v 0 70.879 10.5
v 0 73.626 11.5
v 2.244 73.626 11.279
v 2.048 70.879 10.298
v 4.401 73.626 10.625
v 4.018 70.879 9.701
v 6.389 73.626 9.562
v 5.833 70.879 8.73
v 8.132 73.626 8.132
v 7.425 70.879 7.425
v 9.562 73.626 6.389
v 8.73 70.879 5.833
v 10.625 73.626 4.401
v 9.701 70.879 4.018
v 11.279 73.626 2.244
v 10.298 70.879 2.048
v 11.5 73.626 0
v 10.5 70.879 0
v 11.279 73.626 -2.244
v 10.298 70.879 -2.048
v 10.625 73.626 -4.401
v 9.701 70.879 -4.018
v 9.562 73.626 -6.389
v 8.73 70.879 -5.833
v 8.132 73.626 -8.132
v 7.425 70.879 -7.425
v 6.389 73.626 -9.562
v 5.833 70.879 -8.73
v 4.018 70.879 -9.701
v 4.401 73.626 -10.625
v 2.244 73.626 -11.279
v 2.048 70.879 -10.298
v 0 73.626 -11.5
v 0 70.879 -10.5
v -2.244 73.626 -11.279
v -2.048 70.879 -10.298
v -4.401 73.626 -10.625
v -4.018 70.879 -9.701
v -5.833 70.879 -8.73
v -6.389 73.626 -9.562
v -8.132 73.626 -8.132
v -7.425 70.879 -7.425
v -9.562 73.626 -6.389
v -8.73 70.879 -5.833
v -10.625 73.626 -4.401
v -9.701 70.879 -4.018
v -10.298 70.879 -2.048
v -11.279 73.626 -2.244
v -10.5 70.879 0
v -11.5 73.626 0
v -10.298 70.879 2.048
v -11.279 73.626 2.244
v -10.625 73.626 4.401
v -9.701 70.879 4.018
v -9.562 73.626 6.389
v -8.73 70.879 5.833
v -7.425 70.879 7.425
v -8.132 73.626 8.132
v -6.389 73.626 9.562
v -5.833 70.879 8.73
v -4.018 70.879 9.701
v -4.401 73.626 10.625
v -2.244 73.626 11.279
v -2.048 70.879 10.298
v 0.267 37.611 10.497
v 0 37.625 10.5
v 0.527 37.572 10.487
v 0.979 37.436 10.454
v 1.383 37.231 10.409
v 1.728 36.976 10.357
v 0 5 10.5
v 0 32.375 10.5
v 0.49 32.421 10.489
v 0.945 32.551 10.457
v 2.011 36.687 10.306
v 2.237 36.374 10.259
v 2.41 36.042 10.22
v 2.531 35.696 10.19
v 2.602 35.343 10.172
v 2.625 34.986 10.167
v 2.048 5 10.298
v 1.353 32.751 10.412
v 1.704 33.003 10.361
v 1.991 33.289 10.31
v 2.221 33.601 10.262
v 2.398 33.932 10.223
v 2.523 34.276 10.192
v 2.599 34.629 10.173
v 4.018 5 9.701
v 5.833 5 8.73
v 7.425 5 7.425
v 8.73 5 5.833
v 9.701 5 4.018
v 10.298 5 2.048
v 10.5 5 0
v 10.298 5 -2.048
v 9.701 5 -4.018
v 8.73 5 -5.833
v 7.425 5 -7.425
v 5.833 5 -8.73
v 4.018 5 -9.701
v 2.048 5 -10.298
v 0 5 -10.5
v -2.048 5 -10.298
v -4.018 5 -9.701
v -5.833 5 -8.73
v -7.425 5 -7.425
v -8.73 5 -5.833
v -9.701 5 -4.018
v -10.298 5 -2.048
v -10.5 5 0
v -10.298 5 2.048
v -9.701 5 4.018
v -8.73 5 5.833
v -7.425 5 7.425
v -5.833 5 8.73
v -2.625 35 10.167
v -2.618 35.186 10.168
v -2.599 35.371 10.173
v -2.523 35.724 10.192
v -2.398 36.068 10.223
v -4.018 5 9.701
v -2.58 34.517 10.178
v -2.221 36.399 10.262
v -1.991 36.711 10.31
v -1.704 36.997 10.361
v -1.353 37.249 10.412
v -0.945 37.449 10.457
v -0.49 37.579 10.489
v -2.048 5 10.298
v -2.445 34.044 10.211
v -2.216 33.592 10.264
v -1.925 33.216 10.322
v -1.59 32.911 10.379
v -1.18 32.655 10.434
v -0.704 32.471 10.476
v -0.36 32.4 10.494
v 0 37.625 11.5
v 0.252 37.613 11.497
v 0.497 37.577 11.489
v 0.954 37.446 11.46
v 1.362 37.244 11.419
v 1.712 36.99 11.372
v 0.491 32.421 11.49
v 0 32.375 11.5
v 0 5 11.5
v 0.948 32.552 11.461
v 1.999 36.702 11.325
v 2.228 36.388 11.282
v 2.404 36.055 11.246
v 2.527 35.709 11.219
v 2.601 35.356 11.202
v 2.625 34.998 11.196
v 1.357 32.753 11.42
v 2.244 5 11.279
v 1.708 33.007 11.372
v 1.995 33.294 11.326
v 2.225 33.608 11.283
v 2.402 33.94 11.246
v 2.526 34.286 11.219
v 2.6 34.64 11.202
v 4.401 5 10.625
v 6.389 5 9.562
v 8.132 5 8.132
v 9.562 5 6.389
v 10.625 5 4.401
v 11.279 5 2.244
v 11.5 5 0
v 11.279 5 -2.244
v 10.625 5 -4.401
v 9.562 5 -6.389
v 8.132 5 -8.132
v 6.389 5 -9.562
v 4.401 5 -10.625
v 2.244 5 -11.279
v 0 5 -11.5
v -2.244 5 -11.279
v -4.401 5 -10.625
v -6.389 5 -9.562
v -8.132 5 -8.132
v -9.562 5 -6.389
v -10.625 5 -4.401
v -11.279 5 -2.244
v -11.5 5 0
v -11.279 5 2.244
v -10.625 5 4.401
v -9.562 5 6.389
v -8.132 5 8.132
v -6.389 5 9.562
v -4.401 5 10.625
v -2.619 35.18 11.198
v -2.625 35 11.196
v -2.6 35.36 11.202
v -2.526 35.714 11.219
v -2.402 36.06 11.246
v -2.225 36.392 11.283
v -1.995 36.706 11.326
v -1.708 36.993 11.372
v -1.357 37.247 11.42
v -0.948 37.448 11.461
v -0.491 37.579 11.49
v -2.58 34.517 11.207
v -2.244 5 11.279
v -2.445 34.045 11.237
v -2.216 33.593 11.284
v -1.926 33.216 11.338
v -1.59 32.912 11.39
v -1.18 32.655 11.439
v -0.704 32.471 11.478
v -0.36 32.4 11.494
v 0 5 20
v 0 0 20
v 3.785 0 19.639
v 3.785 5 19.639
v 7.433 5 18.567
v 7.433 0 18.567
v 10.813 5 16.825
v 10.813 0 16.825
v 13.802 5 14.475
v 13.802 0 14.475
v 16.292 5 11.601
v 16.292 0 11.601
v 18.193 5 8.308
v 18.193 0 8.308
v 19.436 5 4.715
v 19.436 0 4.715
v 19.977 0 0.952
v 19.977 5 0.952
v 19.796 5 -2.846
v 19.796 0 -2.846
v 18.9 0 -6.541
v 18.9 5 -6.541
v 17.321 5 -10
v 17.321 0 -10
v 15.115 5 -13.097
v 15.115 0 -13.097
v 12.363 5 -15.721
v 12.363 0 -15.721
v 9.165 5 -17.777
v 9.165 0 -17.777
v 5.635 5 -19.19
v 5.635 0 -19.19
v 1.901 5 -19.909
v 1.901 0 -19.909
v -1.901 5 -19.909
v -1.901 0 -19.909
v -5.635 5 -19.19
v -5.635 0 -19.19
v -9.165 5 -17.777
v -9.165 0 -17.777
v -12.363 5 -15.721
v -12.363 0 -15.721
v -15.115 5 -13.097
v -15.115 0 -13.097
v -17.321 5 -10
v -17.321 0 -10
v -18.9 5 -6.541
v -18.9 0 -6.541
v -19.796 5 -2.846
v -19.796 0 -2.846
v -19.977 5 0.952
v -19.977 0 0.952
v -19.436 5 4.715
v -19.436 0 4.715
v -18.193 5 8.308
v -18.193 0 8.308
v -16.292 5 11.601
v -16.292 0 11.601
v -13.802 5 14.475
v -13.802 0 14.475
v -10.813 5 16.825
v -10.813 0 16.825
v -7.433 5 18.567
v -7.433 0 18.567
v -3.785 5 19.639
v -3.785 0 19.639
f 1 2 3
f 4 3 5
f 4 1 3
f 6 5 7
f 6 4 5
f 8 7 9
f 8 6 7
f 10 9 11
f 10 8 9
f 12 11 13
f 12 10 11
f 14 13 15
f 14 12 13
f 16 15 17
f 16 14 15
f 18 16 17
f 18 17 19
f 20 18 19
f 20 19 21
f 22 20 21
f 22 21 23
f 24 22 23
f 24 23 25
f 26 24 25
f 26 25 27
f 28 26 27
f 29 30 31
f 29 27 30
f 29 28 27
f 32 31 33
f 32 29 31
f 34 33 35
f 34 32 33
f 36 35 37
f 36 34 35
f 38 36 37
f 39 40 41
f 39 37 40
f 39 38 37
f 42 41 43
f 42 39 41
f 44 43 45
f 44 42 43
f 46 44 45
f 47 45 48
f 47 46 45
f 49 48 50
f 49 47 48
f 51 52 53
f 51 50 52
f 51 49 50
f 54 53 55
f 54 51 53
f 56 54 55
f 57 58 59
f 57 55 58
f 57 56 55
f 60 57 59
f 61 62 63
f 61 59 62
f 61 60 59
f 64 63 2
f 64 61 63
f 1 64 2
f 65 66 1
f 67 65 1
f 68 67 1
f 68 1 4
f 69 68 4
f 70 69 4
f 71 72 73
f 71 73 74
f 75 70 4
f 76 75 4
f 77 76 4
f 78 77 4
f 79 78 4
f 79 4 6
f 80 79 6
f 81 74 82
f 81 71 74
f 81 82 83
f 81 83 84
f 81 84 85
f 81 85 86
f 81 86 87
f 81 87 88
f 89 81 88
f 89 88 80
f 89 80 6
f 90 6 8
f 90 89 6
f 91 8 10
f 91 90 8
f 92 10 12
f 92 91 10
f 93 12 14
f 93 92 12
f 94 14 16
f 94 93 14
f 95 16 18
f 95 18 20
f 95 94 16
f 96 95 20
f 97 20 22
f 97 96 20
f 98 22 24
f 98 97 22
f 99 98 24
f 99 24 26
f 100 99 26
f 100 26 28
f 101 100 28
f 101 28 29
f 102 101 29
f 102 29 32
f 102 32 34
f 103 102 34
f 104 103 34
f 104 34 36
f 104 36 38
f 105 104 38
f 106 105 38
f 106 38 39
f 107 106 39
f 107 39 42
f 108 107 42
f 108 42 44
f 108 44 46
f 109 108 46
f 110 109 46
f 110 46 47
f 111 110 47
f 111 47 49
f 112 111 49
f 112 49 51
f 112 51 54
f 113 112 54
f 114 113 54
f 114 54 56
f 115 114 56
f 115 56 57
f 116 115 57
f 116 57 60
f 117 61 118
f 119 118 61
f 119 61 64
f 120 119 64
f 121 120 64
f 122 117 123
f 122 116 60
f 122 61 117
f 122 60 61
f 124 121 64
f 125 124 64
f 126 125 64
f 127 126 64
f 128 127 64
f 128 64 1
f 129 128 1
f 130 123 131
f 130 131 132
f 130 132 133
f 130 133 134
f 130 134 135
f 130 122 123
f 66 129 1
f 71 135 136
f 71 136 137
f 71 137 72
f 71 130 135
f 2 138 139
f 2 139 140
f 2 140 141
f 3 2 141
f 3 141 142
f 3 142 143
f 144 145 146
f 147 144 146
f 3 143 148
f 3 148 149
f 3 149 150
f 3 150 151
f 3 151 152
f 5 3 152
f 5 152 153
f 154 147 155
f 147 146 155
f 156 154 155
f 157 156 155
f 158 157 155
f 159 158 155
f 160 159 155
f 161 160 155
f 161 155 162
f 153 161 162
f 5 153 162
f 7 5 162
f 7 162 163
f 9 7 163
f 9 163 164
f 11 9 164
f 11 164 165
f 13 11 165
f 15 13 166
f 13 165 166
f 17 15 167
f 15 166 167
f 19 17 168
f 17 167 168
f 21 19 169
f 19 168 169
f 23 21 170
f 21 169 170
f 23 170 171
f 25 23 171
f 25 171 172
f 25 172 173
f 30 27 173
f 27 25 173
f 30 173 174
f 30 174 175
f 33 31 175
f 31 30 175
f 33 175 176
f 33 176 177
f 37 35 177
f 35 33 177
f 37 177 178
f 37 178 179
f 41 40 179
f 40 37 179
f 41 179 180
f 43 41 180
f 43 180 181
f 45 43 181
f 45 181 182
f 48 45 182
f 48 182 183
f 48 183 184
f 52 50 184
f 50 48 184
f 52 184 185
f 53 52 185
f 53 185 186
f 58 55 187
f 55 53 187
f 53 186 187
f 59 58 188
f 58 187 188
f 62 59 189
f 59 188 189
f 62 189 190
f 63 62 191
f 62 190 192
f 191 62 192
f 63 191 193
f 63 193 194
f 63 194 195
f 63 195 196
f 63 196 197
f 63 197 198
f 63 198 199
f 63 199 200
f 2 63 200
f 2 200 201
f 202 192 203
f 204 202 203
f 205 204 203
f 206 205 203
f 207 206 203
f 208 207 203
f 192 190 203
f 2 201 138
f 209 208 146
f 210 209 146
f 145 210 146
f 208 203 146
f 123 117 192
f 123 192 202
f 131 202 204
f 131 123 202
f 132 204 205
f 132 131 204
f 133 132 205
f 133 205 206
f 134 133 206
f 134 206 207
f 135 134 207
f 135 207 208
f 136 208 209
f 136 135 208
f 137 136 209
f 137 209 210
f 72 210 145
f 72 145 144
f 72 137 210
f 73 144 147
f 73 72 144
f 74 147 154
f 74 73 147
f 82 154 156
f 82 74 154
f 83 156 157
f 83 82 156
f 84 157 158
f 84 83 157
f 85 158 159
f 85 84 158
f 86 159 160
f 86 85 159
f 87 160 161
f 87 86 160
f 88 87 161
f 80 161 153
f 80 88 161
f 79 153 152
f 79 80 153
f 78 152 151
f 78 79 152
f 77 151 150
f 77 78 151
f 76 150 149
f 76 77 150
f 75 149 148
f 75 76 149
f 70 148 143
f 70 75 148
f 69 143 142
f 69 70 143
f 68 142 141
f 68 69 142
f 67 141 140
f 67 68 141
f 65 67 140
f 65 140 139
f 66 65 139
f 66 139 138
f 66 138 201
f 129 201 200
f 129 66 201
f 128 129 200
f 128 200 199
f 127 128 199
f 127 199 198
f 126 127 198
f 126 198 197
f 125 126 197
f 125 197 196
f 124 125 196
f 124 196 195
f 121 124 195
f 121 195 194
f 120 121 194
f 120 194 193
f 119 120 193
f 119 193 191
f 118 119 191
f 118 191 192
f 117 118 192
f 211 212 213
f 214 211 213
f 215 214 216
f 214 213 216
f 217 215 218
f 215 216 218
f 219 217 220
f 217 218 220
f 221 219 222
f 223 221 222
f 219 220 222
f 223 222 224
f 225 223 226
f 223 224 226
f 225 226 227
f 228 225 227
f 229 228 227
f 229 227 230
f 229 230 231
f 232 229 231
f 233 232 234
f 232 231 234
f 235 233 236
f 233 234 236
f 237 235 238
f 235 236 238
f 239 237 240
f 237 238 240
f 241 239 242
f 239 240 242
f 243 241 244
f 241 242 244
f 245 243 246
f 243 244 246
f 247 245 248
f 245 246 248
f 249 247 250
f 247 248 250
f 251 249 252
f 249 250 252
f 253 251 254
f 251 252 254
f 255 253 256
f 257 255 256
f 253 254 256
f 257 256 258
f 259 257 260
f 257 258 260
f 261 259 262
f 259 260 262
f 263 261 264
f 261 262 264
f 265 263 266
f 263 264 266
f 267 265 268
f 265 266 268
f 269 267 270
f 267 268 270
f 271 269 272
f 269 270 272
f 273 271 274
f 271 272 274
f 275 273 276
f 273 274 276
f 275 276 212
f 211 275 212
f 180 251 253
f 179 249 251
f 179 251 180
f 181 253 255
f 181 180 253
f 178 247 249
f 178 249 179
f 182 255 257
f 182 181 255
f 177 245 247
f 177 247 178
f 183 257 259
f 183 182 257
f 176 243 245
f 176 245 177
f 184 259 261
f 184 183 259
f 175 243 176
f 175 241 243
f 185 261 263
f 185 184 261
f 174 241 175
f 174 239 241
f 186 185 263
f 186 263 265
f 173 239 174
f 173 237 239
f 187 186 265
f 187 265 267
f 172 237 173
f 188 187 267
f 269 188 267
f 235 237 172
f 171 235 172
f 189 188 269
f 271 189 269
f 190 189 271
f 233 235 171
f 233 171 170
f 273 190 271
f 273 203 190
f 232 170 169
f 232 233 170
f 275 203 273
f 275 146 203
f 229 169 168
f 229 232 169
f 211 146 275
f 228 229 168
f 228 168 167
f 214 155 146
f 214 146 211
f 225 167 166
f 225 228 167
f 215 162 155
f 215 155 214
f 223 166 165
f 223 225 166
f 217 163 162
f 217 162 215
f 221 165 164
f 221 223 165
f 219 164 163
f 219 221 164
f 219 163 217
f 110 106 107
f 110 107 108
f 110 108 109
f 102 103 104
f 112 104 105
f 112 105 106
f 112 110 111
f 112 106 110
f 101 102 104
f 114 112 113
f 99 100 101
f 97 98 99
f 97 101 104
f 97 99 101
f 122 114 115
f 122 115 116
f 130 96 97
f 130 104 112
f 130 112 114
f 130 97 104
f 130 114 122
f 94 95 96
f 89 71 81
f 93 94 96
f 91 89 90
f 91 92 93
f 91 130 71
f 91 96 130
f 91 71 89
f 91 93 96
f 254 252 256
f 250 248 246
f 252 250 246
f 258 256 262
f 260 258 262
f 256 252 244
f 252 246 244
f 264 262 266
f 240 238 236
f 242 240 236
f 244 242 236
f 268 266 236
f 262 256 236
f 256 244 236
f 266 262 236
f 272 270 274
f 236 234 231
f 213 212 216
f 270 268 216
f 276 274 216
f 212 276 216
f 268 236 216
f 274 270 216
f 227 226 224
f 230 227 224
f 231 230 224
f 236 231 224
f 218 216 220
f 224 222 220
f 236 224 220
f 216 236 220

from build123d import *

# Parameters (mm, degrees)
SKETCH1_R           = 20
BOSS_EXTRUDE1_DEPTH = 5
SKETCH2_R           = 11.5
SKETCH2_R_2         = 10.5
BOSS_EXTRUDE2_DEPTH = 70
SKETCH3_R           = 2.625
CUT_EXTRUDE1_DEPTH  = 81.156097709
CHAMFER1_SIZE       = 1.5
CHAMFER1_SIZE_2     = 4.121216129


with BuildPart() as part:
    # Sketch1 → Boss-Extrude1 (new body)
    with BuildSketch(Plane(origin=(0, 0, 0), x_dir=(1, 0, 0), z_dir=(0, 1, 0))):
        with Locations(Location((0, 0, 0), (0, 0, 270))):
            Circle(SKETCH1_R)
    extrude(amount=BOSS_EXTRUDE1_DEPTH)

    # Sketch2 → Boss-Extrude2 (add)
    with BuildSketch(Plane(origin=(0, 5, 0), x_dir=(1, 0, 0), z_dir=(0, 1, 0))):
        with Locations(Location((0, 0, 0), (0, 0, 270))):
            Circle(SKETCH2_R)
        with Locations(Location((0, 0, 0), (0, 0, 270))):
            Circle(SKETCH2_R_2, mode=Mode.SUBTRACT)
    extrude(amount=BOSS_EXTRUDE2_DEPTH)

    # Sketch3 → Cut-Extrude1 (cut, through all)
    with BuildSketch(Plane.XY):
        with Locations(Location((0, 35, 0), (0, 0, 180))):
            Circle(SKETCH3_R)
    extrude(amount=CUT_EXTRUDE1_DEPTH, mode=Mode.SUBTRACT)

    # Chamfer1
    # the kernel refuses this chamfer: 4.121216129, 1.5 mm, written as the material it takes off along each edge
    with BuildSketch(Plane(origin=(0, 75, 0), x_dir=(0, 0, 1), z_dir=(-1, 0, 0))) as chamfer1_piece_1:
        Polygon((10.5 + CHAMFER1_SIZE, 0), (10.5, -CHAMFER1_SIZE_2), (10.5, 0), align=None)
    revolve(axis=Axis((0, 75, 0), (0, 1, 0)), mode=Mode.SUBTRACT)


solid = part.part
